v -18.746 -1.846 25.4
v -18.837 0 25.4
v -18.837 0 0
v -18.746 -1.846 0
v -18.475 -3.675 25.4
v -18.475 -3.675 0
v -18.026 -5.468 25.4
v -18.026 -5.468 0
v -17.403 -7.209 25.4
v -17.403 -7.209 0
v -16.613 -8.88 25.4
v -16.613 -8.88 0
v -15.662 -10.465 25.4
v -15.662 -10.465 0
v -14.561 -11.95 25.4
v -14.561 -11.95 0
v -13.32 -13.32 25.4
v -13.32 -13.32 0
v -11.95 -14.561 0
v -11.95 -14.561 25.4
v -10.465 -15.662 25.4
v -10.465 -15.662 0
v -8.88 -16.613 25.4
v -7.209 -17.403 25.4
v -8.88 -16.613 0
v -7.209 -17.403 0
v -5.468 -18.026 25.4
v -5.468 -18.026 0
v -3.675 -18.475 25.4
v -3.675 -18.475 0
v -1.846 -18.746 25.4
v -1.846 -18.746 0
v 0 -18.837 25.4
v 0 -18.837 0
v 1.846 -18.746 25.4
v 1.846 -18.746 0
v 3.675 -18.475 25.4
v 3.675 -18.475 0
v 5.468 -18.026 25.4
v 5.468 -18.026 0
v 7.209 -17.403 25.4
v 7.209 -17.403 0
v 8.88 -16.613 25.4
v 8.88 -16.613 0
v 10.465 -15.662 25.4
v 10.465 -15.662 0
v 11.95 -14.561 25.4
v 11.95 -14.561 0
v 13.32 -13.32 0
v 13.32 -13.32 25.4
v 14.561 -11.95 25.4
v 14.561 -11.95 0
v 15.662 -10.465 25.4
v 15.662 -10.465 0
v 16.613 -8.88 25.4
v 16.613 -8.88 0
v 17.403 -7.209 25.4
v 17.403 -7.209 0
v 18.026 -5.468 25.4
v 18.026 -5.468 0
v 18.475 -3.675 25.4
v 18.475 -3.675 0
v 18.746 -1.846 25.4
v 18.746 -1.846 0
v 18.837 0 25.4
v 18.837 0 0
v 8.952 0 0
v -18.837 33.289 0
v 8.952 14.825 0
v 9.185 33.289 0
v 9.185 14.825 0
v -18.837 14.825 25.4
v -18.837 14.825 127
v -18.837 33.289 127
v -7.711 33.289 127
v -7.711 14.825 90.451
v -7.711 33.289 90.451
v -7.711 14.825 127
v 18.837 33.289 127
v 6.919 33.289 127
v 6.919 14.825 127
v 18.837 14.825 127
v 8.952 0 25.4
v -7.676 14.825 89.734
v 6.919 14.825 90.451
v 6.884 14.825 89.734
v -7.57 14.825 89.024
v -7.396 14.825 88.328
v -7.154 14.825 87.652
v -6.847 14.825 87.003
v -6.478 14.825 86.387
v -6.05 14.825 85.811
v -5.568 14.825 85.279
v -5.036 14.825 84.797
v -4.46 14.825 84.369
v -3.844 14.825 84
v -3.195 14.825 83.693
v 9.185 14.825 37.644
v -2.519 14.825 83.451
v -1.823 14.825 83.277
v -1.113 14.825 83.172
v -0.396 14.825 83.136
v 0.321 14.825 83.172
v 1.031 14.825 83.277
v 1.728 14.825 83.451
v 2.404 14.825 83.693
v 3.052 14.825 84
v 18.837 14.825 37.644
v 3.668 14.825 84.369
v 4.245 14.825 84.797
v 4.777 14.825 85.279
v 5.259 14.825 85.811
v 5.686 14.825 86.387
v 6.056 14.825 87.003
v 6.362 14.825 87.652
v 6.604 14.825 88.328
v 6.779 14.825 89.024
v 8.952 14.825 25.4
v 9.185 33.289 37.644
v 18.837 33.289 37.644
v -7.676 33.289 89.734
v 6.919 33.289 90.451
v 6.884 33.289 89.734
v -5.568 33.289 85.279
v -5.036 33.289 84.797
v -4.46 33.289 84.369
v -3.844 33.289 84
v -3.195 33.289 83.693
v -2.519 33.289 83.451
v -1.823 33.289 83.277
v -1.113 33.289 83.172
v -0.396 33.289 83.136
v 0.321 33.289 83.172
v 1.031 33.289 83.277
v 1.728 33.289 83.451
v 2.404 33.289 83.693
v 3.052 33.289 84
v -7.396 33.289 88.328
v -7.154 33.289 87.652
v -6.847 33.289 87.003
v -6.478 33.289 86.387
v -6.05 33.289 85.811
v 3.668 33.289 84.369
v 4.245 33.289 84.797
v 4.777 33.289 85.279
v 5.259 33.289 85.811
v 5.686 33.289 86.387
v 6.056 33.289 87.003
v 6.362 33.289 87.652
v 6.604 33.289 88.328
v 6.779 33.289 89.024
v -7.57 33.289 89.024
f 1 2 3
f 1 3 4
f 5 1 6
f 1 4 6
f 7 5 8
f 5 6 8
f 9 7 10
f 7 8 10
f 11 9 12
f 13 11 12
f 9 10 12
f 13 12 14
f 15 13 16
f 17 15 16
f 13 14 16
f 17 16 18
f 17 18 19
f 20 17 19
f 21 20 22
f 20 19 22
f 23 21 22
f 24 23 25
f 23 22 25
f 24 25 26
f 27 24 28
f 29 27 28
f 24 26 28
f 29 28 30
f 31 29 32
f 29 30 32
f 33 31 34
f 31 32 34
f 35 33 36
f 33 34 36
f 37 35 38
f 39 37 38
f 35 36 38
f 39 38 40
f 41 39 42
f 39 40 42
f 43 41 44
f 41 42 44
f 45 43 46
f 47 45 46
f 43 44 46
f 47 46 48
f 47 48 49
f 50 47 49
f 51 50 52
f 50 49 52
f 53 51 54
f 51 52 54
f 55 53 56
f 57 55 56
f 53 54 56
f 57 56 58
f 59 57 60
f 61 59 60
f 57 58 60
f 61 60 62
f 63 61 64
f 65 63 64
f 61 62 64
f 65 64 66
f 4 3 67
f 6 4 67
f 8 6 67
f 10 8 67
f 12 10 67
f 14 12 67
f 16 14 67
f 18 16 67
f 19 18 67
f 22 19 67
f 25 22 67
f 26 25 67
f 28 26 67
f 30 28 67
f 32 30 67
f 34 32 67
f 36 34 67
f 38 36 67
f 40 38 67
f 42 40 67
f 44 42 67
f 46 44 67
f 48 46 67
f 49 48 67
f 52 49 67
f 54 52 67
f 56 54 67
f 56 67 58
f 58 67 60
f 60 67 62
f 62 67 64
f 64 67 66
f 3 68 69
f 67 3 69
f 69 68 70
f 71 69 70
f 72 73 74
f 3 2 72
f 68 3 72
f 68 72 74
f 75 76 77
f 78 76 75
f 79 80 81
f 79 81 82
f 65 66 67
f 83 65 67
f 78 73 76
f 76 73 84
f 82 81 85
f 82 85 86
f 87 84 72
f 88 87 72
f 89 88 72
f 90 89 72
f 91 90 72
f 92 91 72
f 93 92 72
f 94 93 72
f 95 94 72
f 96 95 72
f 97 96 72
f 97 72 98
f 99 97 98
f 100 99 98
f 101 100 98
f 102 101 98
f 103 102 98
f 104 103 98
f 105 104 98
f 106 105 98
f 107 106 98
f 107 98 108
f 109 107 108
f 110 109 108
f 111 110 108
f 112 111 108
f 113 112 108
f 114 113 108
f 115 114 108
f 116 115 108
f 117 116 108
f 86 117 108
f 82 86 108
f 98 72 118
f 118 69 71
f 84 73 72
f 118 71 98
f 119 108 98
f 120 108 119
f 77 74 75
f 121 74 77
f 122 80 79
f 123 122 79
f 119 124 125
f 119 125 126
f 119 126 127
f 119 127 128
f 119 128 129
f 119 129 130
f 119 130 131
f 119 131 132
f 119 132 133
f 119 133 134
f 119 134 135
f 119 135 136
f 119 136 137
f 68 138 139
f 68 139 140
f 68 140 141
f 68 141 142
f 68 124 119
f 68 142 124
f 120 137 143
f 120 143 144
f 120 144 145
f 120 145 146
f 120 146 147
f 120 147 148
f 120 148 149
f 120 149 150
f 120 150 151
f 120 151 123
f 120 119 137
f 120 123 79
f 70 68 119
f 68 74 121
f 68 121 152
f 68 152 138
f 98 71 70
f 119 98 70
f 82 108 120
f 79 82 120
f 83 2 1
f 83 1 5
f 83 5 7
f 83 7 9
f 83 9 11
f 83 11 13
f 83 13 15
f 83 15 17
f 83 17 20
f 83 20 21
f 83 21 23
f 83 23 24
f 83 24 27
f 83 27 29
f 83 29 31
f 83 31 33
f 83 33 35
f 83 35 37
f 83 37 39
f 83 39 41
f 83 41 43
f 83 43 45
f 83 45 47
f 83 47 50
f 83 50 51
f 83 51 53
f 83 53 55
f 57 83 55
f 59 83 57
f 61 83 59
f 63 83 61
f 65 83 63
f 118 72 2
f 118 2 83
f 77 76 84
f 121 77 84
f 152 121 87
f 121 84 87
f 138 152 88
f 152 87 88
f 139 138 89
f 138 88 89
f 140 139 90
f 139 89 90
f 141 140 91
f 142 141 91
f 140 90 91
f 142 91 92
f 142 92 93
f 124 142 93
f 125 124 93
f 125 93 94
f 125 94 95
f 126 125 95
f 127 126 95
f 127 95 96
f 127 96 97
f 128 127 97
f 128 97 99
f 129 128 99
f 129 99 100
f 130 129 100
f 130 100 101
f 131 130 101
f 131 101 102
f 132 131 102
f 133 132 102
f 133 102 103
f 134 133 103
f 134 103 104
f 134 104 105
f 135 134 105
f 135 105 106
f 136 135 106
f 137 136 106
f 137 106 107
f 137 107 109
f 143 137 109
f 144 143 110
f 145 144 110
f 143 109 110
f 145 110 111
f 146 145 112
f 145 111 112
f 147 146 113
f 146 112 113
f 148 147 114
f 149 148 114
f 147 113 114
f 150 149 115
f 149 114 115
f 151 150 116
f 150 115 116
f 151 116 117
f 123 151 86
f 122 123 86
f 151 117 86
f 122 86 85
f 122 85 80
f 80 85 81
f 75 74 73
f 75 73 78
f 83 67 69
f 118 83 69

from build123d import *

# Parameters (mm, degrees)
F1_DEPTH = 25.4
F2_W     = 37.6737080514
F2_H     = 18.4638472274
F3_DEPTH = 101.6
F4_W     = 14.6301244386
F4_H     = 36.548535943
F5_DEPTH = 25.4
F6_DEPTH = 25.4
F7_W     = 18.4638472274
F7_H     = 37.6439765096
F8_DEPTH = 9.652


with BuildPart() as f1:
    # F0 (on Top) → F1 (new body)
    with BuildSketch(Plane.XY):
        with BuildLine():
            ThreePointArc((-18.8368540257, 0), (0, -18.8368540257), (18.8368540257, 0))
            Line((18.8368540257, 0), (8.9521668851, 0))
            Line((8.9521668851, 0), (-18.8368540257, 0))
        make_face()
        Polygon((-18.8368540257, 33.2889333367), (-18.8368540257, 0), (8.9521668851, 0), (8.9521668851, 14.8250861093), (18.8368540257, 14.8250861093), (18.8368540257, 33.2889333367), align=None)
    extrude(amount=F1_DEPTH)

    # F2 (on face) → F3 (join)
    with BuildSketch(Plane.XY.offset(25.4)):
        with Locations((0, 24.057009723)):
            Rectangle(F2_W, F2_H)
    extrude(amount=F3_DEPTH)

    # F4 (on face) → F5 (cut)
    with BuildSketch(Plane.XZ.offset(-14.8250861093)):
        with Locations((-0.3958076704, 108.7257320285)):
            Rectangle(F4_W, F4_H)
        with BuildLine():
            Line((6.9192545488, 90.451464057), (-7.7108698897, 90.451464057))
            ThreePointArc((-7.7108698897, 90.451464057), (-0.3958076704, 83.1364018377), (6.9192545488, 90.451464057))
        make_face()
    extrude(amount=-F5_DEPTH, mode=Mode.SUBTRACT)

    # F4 (on face) → F6 (cut)
    with BuildSketch(Plane.XZ.offset(-14.8250861093)):
        with Locations((-0.3958076704, 108.7257320285)):
            Rectangle(F4_W, F4_H)
        with BuildLine():
            Line((6.9192545488, 90.451464057), (-7.7108698897, 90.451464057))
            ThreePointArc((-7.7108698897, 90.451464057), (-0.3958076704, 83.1364018377), (6.9192545488, 90.451464057))
        make_face()
    extrude(amount=-F6_DEPTH, mode=Mode.SUBTRACT)

    # F7 (on face) → F8 (cut)
    with BuildSketch(Plane.YZ.offset(18.8368540257)):
        with Locations((24.057009723, 18.8219882548)):
            Rectangle(F7_W, F7_H)
    extrude(amount=-F8_DEPTH, mode=Mode.SUBTRACT)


solid = f1.part
